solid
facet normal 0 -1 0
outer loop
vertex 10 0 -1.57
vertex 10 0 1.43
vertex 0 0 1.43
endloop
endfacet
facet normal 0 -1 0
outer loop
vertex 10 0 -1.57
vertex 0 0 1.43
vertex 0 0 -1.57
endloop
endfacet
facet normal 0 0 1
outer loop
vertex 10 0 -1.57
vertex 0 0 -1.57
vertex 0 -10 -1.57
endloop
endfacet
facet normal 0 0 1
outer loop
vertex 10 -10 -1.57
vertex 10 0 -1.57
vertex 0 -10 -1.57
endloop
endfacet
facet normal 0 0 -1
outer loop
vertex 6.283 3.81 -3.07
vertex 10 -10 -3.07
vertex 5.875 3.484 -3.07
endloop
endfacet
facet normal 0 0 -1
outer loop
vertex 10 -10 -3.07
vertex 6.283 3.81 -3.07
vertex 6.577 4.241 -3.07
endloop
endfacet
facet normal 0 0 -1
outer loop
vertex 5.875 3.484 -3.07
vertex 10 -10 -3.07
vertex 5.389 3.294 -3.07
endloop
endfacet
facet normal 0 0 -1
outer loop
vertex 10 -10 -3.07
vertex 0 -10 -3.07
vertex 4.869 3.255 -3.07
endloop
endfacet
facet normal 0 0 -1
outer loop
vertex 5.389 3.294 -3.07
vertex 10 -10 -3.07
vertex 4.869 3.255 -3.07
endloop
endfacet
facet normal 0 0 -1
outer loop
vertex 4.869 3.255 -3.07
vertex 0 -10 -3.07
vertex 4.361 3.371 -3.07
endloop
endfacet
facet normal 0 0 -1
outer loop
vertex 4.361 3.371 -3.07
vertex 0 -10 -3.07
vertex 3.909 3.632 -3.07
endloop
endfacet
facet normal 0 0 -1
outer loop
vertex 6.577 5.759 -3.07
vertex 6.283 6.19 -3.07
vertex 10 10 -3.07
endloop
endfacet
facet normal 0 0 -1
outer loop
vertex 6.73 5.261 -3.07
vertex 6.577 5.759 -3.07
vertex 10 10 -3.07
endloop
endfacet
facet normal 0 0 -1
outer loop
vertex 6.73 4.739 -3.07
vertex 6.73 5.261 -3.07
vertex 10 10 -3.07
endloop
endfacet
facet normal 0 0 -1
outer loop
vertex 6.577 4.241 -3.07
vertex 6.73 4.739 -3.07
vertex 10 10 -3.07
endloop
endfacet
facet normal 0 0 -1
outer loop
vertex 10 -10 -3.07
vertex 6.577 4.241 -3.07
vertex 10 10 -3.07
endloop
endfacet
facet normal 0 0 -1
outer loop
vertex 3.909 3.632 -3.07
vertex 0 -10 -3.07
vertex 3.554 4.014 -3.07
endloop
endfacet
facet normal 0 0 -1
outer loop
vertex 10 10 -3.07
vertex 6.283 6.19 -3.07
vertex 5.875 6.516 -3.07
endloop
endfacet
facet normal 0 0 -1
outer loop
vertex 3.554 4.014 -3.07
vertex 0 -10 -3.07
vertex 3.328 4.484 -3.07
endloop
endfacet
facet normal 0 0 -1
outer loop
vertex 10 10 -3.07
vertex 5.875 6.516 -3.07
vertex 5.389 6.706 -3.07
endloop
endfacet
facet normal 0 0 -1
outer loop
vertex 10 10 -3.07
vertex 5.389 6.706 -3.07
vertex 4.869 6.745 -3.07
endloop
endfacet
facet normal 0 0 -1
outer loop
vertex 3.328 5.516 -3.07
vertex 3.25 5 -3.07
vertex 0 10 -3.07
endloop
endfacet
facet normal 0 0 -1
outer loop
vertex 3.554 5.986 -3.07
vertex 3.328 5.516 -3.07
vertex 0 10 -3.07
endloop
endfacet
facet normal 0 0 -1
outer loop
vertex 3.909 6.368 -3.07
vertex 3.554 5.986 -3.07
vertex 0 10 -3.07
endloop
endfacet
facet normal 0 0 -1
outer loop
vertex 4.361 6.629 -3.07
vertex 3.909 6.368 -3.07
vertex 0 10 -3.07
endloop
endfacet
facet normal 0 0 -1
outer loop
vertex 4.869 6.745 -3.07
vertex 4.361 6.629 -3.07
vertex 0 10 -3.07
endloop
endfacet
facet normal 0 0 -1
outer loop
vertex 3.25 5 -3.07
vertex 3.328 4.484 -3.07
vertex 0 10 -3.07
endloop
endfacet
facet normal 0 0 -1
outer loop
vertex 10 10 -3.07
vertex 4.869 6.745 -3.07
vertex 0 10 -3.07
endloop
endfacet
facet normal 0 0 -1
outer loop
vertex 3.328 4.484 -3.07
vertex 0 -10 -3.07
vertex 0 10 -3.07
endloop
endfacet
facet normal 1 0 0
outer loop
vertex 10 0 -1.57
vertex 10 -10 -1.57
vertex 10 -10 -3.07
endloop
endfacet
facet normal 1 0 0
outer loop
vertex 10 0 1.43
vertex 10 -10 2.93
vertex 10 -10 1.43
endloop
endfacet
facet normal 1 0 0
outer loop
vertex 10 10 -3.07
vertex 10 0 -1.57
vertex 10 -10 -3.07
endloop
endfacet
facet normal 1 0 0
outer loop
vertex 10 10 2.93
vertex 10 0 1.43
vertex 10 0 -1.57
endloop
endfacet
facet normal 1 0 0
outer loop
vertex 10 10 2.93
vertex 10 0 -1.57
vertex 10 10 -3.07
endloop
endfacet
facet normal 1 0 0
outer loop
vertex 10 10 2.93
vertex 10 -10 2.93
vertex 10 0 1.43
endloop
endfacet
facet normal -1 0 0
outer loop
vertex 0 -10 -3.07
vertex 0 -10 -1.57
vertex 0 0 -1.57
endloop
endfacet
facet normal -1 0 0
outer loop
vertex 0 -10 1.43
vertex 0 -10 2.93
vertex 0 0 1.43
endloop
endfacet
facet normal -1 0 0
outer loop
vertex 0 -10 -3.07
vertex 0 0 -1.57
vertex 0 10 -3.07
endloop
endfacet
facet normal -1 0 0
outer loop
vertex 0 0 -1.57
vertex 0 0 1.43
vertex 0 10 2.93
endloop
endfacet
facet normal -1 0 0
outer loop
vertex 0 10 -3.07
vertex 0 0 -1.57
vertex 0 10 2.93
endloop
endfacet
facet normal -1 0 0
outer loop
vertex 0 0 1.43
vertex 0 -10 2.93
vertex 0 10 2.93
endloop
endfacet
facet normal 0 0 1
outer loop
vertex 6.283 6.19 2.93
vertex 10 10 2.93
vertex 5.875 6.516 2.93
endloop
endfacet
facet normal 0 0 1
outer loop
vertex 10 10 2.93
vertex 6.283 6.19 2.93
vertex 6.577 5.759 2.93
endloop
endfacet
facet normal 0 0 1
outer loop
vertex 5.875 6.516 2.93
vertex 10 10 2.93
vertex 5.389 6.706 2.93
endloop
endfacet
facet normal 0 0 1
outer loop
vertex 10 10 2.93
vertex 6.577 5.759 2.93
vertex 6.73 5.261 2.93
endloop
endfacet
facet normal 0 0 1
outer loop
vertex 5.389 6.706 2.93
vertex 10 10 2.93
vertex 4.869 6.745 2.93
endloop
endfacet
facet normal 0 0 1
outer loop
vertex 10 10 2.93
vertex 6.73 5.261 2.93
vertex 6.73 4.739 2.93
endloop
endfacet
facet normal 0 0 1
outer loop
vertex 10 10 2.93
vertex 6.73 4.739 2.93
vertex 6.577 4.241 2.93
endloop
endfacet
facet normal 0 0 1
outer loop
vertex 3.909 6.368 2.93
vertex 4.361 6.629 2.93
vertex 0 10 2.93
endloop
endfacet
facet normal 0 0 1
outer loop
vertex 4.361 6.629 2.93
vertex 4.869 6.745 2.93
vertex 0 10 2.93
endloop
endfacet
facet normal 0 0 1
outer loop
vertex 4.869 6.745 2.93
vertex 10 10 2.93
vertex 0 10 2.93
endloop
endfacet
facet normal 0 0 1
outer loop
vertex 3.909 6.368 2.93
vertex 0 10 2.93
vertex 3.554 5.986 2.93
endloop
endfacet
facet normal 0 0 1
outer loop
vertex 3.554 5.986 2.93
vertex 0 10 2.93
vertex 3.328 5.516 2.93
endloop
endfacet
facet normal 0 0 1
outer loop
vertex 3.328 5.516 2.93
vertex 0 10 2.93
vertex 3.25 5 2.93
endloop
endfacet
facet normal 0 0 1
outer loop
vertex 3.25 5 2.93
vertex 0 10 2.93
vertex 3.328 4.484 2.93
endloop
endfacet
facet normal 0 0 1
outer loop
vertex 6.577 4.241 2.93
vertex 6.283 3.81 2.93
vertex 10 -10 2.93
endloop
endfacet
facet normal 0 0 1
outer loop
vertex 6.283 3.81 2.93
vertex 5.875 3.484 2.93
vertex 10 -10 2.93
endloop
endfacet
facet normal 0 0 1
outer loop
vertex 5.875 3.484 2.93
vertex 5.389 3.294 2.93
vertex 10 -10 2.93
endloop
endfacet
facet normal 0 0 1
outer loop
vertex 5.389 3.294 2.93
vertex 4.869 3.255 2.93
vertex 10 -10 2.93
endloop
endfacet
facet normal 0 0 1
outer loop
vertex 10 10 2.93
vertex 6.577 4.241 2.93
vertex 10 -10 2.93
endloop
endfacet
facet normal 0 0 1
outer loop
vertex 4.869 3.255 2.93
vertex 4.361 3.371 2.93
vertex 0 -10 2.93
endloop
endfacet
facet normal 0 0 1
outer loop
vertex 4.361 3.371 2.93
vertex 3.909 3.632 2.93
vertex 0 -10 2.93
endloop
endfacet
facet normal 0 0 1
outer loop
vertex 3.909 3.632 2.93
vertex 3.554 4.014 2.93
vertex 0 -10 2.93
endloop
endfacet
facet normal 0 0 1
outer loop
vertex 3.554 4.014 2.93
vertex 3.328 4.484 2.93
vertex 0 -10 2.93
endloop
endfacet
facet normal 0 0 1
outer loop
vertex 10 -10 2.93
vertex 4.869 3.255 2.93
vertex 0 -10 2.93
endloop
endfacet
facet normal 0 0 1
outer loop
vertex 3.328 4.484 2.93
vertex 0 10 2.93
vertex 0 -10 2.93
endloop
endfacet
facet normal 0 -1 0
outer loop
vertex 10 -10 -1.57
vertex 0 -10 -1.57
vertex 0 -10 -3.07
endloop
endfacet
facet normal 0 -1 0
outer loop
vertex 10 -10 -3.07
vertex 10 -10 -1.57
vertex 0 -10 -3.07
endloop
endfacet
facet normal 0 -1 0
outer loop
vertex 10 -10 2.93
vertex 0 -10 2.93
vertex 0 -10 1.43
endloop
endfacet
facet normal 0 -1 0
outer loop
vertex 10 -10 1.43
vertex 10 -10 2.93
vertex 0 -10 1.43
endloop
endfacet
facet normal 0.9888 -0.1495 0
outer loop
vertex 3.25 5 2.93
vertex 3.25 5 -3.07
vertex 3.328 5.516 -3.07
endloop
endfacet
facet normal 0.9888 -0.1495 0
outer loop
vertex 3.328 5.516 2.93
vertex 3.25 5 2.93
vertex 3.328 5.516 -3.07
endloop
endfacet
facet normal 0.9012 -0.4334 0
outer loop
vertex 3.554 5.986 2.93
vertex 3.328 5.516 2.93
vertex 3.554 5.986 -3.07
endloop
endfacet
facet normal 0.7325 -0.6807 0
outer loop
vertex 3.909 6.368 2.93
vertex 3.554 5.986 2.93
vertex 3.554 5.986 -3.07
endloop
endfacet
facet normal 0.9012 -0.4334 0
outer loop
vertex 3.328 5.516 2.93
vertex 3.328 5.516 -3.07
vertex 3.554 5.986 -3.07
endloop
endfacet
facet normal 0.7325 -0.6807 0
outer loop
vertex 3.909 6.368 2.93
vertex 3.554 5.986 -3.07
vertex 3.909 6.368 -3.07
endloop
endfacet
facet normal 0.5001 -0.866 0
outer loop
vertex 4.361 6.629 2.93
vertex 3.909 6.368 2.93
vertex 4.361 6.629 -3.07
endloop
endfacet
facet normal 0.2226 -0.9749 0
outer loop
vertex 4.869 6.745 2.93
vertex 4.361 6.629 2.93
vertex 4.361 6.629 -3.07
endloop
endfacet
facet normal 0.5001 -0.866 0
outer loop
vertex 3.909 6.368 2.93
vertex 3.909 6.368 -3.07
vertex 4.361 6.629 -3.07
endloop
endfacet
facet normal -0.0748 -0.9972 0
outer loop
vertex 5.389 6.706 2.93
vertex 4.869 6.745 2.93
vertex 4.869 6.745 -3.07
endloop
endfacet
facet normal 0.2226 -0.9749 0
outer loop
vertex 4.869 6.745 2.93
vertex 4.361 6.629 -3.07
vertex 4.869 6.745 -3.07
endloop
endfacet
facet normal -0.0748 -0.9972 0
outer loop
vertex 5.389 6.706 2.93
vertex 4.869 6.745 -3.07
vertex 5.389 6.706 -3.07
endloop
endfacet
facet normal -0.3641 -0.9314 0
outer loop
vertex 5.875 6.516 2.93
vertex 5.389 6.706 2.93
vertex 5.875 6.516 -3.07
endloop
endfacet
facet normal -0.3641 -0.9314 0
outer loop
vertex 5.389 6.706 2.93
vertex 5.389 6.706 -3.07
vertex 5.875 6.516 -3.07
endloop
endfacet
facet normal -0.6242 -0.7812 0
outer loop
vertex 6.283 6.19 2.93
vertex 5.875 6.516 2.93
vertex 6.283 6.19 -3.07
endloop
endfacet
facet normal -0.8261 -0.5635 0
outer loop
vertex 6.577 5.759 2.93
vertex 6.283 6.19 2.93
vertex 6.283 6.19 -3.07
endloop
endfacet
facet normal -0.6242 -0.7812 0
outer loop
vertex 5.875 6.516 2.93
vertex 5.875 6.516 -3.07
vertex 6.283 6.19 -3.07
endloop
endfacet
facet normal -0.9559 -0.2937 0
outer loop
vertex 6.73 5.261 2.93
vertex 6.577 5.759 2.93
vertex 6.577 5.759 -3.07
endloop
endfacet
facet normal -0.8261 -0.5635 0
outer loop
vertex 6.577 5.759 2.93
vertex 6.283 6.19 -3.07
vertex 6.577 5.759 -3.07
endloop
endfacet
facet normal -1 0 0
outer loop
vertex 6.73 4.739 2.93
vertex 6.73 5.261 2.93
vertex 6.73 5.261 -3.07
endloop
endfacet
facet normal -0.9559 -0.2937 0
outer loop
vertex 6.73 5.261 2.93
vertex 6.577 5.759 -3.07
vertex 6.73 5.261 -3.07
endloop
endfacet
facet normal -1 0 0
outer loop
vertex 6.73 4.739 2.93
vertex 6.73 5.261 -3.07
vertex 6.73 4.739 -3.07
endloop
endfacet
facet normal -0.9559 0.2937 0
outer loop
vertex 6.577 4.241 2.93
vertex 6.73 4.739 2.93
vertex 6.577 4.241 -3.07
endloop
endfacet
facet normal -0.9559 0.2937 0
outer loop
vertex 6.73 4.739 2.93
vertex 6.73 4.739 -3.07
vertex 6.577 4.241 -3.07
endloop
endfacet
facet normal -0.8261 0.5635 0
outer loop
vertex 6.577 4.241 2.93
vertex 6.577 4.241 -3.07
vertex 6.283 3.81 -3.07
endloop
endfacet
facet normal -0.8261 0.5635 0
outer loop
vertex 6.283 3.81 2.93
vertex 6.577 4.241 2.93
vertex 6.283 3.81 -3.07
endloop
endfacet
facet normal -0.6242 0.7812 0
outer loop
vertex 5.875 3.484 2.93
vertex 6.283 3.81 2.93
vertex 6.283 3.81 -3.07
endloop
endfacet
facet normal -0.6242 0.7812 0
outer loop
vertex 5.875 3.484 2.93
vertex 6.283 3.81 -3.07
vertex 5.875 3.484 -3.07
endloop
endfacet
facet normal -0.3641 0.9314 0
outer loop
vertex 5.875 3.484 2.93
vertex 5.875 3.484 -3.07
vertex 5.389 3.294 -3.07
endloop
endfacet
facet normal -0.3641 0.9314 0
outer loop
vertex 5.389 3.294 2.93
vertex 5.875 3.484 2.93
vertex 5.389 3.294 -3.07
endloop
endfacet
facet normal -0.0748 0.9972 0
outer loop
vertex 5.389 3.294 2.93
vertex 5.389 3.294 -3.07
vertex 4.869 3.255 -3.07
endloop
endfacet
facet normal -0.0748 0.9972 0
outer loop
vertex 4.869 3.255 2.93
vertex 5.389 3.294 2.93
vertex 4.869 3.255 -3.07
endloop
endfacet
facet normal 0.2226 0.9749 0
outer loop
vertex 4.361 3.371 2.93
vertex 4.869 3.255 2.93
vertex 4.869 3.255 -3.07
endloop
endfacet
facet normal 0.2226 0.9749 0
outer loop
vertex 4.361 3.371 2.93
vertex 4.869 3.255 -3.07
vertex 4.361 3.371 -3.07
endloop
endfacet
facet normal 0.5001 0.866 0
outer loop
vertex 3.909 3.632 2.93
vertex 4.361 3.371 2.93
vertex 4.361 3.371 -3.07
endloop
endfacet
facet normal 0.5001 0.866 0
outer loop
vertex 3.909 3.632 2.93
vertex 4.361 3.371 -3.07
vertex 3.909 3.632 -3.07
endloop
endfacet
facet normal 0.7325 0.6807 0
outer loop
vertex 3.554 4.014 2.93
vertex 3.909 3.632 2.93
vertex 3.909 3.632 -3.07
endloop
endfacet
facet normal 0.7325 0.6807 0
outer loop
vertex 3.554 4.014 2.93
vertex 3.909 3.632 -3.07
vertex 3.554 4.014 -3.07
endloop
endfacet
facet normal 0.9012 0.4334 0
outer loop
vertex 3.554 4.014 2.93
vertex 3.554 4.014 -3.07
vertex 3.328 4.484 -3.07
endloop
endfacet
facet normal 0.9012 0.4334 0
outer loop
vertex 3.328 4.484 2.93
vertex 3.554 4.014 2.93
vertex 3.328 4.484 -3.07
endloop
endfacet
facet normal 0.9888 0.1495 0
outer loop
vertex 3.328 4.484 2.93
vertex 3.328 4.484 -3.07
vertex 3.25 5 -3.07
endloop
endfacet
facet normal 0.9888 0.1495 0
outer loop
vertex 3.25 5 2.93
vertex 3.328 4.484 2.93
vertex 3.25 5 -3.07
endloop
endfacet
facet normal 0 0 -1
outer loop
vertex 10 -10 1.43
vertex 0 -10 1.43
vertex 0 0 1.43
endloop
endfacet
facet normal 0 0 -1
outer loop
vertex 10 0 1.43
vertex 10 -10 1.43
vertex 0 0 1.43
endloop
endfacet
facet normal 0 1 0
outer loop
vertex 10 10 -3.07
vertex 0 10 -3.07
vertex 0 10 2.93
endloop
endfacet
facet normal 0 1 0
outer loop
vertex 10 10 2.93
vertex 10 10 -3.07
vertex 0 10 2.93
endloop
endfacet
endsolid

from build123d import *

# Parameters (mm, degrees)
F1_DEPTH = 10
F3_D     = 3.5


with BuildPart() as f1:
    # F0 (on Right) → F1 (new body)
    with BuildSketch(Plane.YZ):
        Polygon((-10, -3.070235), (10, -3.070235), (10, 2.929765), (-10, 2.929765), (-10, 1.429765), (0, 1.429765), (0, -1.570235), (-10, -1.570235), align=None)
    extrude(amount=F1_DEPTH)

    # F3 (through all)
    with Locations(Plane.XY.offset(2.929765)):
        with Locations((5, 5)):
            Hole(F3_D / 2)


solid = f1.part
